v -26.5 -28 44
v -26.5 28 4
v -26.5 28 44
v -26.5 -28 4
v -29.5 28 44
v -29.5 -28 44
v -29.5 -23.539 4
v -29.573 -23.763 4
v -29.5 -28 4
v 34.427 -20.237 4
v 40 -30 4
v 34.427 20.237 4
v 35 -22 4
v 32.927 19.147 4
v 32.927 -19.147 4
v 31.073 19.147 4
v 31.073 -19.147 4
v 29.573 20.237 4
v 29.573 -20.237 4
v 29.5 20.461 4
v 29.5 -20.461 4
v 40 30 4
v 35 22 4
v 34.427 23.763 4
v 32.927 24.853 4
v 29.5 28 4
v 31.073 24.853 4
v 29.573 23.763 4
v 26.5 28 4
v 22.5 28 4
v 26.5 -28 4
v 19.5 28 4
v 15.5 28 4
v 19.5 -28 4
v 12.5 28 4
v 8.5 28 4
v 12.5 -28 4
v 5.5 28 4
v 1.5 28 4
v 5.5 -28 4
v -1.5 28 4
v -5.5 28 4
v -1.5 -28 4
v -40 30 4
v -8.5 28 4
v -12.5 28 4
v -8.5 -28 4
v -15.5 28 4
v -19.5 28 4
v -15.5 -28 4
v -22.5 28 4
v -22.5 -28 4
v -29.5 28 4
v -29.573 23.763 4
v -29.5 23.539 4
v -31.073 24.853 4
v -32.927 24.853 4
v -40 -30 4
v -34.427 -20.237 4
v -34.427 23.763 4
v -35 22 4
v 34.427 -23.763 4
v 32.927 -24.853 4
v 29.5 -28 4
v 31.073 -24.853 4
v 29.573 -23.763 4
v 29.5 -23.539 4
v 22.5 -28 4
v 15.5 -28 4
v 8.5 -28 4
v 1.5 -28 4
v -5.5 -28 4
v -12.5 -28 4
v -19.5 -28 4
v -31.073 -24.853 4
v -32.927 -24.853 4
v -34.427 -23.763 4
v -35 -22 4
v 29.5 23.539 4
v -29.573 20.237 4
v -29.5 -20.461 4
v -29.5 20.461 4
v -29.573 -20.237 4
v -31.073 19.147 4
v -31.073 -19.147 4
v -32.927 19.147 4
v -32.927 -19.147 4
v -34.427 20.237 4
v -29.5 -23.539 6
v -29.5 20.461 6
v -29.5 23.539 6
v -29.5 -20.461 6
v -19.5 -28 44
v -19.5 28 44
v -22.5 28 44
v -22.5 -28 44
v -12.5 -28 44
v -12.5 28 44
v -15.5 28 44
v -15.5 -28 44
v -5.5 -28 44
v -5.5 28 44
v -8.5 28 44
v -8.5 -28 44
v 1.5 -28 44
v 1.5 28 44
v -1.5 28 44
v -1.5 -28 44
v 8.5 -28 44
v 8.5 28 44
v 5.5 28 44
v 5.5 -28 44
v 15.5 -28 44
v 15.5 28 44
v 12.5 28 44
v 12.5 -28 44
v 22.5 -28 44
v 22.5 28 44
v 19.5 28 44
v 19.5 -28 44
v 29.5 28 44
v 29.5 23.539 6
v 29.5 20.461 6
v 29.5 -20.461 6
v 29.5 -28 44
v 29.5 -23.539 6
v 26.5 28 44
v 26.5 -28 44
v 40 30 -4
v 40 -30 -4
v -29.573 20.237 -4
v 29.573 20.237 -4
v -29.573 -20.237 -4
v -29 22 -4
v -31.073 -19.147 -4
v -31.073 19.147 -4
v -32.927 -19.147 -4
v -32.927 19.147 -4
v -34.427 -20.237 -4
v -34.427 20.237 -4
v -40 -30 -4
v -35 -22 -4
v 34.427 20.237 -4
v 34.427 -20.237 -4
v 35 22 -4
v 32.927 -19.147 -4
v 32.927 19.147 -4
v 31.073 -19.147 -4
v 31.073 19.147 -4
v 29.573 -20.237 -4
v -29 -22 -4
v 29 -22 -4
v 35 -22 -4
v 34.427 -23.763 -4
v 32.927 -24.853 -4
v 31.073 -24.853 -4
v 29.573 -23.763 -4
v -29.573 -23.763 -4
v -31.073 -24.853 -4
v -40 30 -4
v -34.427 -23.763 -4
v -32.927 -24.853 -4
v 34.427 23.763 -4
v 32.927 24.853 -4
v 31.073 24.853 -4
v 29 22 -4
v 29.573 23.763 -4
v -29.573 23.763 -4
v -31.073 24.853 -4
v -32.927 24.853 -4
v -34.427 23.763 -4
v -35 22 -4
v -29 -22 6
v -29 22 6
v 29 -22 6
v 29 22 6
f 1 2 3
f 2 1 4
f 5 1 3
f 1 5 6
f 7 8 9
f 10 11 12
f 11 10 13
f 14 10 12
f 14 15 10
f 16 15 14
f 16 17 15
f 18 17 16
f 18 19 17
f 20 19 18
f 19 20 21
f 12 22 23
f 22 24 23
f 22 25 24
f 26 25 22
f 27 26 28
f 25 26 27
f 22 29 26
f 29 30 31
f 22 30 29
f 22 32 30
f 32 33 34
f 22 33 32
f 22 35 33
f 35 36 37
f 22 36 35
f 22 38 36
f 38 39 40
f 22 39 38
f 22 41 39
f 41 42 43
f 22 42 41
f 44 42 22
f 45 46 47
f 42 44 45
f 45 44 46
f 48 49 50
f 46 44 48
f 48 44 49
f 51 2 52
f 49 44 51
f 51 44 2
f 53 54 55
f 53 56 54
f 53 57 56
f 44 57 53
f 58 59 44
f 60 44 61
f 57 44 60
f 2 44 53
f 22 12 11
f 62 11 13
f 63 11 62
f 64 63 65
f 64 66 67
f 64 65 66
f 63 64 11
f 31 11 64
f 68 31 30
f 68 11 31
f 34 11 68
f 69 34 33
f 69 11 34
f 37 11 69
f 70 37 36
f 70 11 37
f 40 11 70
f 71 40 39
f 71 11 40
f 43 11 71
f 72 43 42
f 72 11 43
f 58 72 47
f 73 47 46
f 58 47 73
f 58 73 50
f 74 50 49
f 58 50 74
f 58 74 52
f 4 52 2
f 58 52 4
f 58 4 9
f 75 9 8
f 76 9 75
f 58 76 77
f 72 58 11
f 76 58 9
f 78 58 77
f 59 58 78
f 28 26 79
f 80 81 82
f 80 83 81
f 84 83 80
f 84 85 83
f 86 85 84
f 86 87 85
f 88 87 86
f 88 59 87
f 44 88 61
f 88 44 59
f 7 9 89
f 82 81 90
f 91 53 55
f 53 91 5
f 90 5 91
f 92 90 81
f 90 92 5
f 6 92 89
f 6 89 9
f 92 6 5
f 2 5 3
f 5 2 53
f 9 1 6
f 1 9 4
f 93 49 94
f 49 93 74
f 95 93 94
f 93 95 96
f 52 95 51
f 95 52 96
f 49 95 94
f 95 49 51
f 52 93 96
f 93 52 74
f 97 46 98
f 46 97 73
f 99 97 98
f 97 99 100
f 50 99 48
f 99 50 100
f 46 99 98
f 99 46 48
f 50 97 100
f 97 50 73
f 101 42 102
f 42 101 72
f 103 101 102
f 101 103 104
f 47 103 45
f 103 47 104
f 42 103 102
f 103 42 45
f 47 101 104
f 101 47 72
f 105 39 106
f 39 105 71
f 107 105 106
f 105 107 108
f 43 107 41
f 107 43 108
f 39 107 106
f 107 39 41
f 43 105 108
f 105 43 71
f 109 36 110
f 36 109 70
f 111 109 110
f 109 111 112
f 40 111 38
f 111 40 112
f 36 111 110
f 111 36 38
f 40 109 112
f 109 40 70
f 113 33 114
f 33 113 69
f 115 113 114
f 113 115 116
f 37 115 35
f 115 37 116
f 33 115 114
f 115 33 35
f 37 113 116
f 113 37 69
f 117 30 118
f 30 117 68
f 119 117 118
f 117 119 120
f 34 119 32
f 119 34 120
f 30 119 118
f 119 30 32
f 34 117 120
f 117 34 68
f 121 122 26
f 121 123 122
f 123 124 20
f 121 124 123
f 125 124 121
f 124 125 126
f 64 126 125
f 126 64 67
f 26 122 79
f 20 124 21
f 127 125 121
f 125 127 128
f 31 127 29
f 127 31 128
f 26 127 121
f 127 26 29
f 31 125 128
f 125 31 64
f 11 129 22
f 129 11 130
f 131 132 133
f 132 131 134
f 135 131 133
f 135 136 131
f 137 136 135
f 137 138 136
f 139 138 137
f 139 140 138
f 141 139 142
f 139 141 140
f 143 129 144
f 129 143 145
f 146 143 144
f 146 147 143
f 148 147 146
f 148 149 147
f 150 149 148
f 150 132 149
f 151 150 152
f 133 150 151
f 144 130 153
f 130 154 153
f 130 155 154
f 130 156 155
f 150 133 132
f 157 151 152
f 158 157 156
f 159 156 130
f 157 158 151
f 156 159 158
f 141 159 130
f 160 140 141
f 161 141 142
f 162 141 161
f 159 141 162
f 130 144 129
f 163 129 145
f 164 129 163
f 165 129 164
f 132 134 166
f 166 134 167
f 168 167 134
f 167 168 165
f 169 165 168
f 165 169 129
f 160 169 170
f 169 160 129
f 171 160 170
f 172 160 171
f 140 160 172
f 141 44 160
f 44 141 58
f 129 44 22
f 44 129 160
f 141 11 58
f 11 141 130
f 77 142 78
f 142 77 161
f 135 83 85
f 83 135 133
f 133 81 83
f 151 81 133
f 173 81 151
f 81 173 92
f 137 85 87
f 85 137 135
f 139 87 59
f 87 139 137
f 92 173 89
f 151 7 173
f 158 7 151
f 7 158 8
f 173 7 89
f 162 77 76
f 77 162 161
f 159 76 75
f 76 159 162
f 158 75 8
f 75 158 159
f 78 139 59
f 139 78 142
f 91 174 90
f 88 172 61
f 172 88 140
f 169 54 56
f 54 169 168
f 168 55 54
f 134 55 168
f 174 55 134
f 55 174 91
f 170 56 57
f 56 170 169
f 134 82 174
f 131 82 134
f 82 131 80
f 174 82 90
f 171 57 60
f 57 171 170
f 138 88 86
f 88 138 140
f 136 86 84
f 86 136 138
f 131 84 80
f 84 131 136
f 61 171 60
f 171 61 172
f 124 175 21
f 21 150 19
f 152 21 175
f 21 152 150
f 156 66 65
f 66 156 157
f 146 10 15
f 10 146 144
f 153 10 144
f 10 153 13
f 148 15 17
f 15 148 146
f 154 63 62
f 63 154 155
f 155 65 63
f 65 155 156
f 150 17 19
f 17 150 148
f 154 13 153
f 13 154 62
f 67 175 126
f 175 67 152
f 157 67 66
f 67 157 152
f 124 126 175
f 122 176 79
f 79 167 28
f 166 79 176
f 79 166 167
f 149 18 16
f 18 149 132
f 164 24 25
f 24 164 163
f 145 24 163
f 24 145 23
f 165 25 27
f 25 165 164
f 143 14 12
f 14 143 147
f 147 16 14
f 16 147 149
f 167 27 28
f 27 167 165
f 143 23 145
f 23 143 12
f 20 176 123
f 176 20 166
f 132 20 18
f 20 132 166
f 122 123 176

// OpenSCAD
// 3DScad sample: CPU heatsink
// Uses only the currently round-trippable subset.

module scene_model() {
    base_w = 80;
    base_d = 60;
    base_h = 8;
    fin_count = 9;
    fin_spacing = 7;
    fin_t = 3;
    fin_h = 40;
    hole_r = 3;

    difference() {
        union() {
            cube([base_w, base_d, base_h], center=true);
            for (i = [0 : 1 : fin_count - 1]) {
                translate([-(fin_count - 1) * fin_spacing / 2 + i * fin_spacing, 0, base_h / 2 + fin_h / 2]) {
                    cube([fin_t, base_d - 4, fin_h], center=true);
                }
            }
        }
        for (sx = [-1 : 2 : 1]) {
            for (sy = [-1 : 2 : 1]) {
                translate([sx * (base_w / 2 - 8), sy * (base_d / 2 - 8), 0]) {
                    cylinder(h=base_h + 4, r=hole_r, center=true);
                }
            }
        }
    }
}

scene_model();
